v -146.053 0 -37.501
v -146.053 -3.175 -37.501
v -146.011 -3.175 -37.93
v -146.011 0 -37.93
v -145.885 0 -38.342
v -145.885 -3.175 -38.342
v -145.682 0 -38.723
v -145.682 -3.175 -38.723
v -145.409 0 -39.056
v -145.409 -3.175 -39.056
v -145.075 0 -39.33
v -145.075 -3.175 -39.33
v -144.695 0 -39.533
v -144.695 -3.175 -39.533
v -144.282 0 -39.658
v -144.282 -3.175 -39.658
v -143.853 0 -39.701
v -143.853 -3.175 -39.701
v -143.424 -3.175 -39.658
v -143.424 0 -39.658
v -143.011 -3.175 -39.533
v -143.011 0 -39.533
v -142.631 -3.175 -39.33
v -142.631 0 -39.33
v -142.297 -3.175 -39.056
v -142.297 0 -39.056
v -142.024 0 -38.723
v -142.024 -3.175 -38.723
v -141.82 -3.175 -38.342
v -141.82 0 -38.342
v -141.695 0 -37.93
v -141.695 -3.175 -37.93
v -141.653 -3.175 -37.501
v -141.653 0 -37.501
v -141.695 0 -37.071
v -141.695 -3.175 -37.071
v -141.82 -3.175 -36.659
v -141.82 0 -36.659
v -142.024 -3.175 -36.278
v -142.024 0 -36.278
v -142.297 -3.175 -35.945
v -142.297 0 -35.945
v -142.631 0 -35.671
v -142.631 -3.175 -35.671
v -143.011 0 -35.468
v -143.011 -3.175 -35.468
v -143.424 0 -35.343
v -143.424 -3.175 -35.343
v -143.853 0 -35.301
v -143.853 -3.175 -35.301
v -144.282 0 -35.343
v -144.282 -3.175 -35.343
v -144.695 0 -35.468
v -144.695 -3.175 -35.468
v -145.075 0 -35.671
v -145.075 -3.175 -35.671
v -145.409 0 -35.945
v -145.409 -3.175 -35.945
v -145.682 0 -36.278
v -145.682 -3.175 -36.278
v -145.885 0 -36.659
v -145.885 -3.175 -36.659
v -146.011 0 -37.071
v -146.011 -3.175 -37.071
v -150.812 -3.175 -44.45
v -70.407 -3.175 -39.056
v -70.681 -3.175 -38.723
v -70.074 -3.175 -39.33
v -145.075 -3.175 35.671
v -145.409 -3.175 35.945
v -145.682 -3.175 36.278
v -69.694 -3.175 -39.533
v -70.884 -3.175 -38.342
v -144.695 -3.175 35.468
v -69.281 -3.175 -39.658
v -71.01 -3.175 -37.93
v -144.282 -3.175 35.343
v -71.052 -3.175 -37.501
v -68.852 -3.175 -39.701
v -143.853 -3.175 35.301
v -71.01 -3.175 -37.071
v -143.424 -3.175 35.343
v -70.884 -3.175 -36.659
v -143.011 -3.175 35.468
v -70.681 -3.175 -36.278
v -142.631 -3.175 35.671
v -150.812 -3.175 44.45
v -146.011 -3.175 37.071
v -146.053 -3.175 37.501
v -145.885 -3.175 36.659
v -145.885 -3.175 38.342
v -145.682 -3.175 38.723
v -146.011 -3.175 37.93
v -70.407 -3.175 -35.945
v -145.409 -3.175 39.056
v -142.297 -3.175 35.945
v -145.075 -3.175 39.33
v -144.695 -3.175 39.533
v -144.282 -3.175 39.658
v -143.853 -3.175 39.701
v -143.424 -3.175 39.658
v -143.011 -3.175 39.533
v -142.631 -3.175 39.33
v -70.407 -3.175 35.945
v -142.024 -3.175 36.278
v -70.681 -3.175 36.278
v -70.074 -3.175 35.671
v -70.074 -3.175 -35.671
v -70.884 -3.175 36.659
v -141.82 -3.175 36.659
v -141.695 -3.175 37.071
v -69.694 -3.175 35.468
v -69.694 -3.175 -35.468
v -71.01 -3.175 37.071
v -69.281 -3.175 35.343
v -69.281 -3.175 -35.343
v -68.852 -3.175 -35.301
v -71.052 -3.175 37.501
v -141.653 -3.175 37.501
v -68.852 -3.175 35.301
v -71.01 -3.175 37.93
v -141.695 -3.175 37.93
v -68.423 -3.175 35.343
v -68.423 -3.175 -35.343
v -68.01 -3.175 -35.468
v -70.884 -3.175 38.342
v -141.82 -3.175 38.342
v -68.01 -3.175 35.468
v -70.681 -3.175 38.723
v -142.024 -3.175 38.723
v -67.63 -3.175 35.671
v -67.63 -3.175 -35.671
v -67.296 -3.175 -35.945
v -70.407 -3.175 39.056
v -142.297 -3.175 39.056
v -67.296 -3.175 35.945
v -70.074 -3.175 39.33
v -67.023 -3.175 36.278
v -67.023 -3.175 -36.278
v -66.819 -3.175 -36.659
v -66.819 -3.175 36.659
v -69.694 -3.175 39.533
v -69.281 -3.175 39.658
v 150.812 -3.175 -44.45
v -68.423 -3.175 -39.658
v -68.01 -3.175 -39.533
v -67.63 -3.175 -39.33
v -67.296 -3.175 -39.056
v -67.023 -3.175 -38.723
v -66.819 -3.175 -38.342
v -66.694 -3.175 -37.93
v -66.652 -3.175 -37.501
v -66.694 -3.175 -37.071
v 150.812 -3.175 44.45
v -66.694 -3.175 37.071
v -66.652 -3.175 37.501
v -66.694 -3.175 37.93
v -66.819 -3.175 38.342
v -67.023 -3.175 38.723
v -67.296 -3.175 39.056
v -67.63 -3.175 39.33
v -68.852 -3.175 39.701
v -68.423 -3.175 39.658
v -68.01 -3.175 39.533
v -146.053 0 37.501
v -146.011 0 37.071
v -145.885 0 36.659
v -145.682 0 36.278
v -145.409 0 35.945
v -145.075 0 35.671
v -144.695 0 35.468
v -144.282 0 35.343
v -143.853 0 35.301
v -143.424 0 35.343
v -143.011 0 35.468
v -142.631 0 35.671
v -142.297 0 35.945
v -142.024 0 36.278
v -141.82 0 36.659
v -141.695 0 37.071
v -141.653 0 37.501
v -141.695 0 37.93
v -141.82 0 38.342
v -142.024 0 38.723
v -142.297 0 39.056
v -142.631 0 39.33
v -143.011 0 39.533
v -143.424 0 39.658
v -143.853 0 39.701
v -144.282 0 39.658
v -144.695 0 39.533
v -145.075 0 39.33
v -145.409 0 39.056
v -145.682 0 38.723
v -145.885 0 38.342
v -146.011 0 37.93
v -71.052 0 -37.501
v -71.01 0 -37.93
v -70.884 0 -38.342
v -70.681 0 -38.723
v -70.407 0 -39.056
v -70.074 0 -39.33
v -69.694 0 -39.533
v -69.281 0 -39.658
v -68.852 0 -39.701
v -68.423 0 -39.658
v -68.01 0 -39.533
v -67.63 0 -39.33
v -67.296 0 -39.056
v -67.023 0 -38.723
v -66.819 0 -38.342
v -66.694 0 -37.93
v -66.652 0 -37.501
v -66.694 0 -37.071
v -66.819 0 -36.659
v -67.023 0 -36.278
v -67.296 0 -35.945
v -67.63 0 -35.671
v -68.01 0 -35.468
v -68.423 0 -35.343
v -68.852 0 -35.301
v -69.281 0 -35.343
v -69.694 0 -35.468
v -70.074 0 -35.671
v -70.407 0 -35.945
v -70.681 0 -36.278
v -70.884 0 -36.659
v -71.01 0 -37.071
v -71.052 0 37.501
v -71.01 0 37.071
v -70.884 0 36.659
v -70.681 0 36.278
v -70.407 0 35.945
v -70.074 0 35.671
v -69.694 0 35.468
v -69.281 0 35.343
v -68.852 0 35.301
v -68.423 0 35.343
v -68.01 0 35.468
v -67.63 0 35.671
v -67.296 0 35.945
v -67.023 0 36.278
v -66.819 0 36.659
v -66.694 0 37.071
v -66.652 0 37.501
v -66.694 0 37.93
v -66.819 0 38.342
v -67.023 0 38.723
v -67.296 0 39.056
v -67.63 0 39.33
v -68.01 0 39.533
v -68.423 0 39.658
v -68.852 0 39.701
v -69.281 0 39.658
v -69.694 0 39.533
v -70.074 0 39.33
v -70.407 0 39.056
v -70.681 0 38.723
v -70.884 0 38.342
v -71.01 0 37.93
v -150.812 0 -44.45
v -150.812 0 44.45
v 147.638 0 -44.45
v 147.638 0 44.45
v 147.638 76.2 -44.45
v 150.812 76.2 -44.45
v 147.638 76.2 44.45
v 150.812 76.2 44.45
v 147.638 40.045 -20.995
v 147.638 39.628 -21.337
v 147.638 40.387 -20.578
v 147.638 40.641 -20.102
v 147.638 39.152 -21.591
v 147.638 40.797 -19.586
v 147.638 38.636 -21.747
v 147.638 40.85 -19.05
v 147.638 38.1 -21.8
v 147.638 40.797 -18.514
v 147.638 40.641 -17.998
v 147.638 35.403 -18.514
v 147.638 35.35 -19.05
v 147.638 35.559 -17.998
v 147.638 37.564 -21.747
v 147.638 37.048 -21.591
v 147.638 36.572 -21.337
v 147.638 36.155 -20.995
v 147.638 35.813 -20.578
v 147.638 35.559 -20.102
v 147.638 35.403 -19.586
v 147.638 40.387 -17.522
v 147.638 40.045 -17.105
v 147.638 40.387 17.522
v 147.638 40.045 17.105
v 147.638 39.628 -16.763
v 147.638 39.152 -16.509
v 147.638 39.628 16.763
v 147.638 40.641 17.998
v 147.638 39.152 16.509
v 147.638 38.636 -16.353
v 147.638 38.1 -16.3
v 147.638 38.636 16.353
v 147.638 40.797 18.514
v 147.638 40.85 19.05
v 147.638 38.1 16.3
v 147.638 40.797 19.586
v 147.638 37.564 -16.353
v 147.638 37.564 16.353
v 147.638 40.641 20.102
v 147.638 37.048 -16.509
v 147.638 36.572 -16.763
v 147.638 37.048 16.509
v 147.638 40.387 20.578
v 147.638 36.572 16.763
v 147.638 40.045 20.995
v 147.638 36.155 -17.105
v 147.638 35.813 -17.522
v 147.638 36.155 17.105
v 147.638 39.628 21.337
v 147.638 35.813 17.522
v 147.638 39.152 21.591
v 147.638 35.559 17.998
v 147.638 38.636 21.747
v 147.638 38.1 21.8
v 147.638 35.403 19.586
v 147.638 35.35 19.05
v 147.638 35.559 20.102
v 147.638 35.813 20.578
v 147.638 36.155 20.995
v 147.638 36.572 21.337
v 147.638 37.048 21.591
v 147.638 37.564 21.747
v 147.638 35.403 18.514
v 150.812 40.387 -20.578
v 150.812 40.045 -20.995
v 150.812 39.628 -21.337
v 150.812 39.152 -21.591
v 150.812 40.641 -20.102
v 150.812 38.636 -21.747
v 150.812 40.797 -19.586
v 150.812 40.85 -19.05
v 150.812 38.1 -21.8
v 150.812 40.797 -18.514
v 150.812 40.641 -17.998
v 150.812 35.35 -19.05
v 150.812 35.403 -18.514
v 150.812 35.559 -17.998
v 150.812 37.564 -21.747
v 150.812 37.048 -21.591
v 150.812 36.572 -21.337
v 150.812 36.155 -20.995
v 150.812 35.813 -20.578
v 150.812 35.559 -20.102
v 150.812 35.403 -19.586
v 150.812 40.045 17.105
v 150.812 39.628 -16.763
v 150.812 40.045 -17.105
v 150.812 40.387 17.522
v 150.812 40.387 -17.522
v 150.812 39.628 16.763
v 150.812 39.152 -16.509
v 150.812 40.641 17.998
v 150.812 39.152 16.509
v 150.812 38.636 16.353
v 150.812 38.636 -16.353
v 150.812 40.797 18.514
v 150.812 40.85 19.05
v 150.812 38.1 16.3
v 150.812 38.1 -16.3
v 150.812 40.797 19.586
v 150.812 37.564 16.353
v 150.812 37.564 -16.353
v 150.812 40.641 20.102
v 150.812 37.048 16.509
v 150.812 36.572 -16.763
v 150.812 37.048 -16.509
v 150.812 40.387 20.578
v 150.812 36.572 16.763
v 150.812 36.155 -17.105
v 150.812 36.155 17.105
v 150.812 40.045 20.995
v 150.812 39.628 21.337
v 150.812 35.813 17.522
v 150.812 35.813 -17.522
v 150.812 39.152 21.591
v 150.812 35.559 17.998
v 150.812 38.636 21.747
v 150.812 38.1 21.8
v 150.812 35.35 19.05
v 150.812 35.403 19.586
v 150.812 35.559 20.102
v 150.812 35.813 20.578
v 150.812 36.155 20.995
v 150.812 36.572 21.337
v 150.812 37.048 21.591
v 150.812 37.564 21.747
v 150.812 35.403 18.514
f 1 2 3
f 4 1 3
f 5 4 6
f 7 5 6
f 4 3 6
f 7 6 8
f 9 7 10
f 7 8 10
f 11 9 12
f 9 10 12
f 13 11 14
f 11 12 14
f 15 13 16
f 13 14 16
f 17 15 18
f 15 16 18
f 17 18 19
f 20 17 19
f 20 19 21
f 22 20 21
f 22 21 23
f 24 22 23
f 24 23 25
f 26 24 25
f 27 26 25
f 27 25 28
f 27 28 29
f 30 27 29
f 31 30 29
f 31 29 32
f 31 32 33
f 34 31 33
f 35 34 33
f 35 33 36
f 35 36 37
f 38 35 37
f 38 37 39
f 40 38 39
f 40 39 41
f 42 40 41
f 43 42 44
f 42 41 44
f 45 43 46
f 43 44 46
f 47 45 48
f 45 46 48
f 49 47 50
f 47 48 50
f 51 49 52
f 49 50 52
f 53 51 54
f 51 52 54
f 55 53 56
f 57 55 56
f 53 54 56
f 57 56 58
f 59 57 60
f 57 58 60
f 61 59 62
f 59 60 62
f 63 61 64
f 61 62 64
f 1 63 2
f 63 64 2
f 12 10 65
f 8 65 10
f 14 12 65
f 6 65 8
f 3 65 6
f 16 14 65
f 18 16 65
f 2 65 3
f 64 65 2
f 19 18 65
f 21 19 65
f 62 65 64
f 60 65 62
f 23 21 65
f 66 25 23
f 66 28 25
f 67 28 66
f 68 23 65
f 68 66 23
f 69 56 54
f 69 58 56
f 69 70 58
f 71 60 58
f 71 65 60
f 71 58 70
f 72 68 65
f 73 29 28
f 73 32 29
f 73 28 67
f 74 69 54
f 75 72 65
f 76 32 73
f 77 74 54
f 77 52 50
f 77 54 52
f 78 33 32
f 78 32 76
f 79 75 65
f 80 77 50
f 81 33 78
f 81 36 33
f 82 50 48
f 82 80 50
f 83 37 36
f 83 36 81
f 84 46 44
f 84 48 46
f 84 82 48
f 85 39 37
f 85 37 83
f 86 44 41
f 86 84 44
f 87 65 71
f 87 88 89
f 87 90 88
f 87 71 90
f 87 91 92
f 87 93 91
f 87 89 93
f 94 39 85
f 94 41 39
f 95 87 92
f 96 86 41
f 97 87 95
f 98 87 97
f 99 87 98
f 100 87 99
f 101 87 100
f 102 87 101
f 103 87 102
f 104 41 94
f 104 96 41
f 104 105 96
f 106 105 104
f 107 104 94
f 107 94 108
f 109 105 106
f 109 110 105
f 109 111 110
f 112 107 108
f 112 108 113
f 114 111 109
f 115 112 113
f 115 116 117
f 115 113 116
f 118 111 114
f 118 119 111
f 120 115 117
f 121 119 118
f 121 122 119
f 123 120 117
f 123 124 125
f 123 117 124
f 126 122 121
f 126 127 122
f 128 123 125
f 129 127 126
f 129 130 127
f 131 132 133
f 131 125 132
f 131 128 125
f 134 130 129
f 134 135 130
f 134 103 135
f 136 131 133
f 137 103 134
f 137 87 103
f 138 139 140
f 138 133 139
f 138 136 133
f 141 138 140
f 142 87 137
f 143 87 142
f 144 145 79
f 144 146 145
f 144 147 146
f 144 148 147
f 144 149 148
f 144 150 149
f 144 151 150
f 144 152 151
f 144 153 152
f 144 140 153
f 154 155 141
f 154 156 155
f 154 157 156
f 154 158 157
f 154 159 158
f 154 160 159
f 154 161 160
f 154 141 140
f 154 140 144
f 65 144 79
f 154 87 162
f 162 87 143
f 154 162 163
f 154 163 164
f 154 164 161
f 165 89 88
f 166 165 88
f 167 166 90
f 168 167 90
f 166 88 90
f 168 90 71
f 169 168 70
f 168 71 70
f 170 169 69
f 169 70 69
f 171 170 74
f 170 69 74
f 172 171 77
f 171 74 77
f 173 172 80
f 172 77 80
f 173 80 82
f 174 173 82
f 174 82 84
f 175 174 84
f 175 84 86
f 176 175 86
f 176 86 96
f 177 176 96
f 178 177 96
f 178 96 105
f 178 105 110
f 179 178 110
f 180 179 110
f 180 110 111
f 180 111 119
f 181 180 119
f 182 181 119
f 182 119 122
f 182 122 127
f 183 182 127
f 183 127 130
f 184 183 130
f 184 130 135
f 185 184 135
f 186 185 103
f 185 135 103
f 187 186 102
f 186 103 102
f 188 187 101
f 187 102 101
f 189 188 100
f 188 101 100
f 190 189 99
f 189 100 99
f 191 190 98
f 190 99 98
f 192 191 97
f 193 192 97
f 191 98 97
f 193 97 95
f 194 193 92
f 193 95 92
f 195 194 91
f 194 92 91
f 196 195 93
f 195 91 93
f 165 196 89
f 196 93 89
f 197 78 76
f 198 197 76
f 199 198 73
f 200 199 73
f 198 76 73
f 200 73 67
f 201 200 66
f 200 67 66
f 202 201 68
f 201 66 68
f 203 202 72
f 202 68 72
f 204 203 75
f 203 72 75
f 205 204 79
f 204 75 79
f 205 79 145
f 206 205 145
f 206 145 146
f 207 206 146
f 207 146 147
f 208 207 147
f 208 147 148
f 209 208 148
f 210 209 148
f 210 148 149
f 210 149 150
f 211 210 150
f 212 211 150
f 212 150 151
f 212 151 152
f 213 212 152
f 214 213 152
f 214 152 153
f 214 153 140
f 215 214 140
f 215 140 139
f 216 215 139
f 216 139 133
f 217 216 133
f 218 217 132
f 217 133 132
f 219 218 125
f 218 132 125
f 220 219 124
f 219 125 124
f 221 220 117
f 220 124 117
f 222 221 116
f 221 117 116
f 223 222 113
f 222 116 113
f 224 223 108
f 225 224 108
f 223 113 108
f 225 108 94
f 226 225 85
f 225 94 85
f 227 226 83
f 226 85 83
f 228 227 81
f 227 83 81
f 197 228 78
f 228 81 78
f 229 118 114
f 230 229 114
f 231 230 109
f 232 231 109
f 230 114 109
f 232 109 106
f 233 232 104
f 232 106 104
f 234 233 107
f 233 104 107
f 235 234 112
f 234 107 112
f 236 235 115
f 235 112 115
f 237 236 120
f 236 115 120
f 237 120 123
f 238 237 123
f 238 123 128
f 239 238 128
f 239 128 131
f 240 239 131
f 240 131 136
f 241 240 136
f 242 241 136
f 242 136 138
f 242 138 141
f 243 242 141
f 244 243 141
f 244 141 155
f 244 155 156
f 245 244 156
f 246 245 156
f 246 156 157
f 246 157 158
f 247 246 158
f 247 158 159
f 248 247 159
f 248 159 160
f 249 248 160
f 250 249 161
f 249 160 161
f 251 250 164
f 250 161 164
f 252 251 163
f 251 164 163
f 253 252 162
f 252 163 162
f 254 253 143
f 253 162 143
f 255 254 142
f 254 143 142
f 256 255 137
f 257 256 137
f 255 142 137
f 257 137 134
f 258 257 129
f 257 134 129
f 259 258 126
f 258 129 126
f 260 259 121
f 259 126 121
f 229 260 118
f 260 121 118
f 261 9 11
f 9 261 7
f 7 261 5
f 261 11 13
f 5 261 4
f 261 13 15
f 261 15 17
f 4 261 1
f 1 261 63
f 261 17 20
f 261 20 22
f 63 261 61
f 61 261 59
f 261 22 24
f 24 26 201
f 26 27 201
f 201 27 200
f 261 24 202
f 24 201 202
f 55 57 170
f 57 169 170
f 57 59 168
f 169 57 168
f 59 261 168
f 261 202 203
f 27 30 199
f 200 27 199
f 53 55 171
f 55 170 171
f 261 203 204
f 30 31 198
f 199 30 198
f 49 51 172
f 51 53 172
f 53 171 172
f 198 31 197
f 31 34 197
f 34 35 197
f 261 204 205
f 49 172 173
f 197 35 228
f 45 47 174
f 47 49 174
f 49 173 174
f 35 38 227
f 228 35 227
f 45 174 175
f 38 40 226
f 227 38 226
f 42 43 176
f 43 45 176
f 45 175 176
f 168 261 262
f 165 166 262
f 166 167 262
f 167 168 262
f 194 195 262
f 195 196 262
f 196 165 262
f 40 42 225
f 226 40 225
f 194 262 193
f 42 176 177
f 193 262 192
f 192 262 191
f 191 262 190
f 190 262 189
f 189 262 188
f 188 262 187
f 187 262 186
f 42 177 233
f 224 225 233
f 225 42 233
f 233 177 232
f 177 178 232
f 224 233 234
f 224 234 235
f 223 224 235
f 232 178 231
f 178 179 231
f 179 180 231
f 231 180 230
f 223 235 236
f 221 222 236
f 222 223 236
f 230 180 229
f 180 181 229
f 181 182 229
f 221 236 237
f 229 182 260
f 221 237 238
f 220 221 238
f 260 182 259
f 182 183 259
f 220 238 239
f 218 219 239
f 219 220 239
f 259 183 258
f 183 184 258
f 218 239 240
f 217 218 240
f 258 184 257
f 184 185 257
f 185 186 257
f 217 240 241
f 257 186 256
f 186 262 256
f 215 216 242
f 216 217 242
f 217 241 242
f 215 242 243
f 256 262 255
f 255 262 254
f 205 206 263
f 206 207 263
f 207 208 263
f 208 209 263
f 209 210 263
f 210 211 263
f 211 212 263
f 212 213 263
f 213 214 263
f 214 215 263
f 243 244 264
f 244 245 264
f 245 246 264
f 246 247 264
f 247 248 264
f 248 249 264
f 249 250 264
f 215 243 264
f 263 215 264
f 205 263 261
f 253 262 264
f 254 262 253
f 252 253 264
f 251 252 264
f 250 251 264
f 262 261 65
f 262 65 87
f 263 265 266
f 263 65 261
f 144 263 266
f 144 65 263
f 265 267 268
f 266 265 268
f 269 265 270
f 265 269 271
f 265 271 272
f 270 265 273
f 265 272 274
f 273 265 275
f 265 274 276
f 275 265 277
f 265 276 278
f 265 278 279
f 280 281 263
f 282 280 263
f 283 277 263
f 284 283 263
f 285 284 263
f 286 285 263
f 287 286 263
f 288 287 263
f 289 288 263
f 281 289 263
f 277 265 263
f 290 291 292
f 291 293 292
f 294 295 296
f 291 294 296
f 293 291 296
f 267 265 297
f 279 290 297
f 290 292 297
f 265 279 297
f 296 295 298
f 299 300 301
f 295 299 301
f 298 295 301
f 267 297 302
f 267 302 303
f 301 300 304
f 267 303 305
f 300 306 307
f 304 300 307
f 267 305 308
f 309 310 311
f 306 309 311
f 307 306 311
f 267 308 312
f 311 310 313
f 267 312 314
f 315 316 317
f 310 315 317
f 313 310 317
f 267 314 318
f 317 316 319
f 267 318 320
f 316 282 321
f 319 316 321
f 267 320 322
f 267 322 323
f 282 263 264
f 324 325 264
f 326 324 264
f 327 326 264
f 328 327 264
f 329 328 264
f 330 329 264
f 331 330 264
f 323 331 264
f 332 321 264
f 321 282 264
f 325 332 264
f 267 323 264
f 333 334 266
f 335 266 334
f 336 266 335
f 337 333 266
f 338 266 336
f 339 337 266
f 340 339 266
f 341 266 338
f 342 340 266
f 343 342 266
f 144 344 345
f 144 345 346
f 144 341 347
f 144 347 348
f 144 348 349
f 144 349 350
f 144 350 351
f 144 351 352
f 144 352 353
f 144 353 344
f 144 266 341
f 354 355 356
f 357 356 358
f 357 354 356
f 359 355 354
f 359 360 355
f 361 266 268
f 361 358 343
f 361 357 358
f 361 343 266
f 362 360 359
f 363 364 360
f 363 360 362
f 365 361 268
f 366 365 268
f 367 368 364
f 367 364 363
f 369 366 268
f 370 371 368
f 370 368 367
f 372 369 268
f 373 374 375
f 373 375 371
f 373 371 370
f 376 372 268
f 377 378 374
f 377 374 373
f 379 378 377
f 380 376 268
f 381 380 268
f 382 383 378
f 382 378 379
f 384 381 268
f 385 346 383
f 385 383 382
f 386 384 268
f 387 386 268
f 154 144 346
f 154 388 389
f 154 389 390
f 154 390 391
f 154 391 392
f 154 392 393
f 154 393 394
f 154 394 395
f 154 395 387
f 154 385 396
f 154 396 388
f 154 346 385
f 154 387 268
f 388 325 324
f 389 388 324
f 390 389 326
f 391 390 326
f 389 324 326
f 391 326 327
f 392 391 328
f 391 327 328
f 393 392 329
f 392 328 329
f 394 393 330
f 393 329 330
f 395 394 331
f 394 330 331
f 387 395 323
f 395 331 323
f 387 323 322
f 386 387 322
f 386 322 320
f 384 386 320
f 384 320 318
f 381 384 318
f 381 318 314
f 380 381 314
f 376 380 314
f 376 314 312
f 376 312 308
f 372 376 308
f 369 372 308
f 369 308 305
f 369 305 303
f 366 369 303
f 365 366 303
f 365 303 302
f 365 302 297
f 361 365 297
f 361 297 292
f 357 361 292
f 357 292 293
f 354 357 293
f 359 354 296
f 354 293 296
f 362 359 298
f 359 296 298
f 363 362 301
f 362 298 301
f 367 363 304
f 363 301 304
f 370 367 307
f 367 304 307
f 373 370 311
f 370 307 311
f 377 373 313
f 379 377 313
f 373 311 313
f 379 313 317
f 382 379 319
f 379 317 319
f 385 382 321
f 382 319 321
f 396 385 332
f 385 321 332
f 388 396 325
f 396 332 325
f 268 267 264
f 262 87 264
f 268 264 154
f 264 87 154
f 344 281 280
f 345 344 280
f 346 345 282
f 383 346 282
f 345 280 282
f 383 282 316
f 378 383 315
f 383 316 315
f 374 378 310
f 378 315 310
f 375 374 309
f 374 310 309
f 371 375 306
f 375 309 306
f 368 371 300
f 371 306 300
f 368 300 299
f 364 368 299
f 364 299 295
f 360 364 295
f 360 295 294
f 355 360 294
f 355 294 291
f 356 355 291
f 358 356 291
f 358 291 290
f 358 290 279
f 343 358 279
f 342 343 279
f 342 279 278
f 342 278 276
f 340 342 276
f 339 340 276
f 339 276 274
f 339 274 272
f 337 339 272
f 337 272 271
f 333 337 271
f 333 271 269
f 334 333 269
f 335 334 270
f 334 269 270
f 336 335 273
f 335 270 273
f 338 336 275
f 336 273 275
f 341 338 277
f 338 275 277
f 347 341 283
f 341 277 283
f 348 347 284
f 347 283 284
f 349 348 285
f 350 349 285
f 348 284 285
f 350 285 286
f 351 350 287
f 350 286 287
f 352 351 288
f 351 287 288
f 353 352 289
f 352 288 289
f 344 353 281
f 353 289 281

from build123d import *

# Parameters (mm, degrees)
F0_W     = 301.625
F0_H     = 88.9
F0_W_2   = 75.00112
F0_H_2   = 75.00112
F1_DEPTH = 3.175
F2_D     = 4.4
F3_W     = 3.175
F3_H     = 88.9
F4_DEPTH = 76.2
F6_D     = 5.5


with BuildPart() as f1:
    # F0 (on Front) → F1 (new body)
    with BuildSketch(Plane.XZ):
        Rectangle(F0_W, F0_H)
        with Locations((-106.35234, 0)):
            Rectangle(F0_W_2, F0_H_2, mode=Mode.SUBTRACT)
        with Locations((-106.35234, 0)):
            Rectangle(F0_W_2, F0_H_2)
    extrude(amount=F1_DEPTH)

    # F2 (through all)
    with Locations(Plane(origin=(0, 0, 0), x_dir=(1, 0, 0), z_dir=(0, 1, 0))):
        with Locations((-143.8529, -37.50056), (-68.85178, -37.50056), (-68.85178, 37.50056), (-143.8529, 37.50056)):
            Hole(F2_D / 2)

    # F3 (on face) → F4 (join)
    with BuildSketch(Plane.XZ):
        with Locations((149.225, 0)):
            Rectangle(F3_W, F3_H)
    extrude(amount=-F4_DEPTH)

    # F6 (through all)
    with Locations(Plane.YZ.offset(150.8125)):
        with Locations((38.1, 19.05), (38.1, -19.05)):
            Hole(F6_D / 2)


solid = f1.part
